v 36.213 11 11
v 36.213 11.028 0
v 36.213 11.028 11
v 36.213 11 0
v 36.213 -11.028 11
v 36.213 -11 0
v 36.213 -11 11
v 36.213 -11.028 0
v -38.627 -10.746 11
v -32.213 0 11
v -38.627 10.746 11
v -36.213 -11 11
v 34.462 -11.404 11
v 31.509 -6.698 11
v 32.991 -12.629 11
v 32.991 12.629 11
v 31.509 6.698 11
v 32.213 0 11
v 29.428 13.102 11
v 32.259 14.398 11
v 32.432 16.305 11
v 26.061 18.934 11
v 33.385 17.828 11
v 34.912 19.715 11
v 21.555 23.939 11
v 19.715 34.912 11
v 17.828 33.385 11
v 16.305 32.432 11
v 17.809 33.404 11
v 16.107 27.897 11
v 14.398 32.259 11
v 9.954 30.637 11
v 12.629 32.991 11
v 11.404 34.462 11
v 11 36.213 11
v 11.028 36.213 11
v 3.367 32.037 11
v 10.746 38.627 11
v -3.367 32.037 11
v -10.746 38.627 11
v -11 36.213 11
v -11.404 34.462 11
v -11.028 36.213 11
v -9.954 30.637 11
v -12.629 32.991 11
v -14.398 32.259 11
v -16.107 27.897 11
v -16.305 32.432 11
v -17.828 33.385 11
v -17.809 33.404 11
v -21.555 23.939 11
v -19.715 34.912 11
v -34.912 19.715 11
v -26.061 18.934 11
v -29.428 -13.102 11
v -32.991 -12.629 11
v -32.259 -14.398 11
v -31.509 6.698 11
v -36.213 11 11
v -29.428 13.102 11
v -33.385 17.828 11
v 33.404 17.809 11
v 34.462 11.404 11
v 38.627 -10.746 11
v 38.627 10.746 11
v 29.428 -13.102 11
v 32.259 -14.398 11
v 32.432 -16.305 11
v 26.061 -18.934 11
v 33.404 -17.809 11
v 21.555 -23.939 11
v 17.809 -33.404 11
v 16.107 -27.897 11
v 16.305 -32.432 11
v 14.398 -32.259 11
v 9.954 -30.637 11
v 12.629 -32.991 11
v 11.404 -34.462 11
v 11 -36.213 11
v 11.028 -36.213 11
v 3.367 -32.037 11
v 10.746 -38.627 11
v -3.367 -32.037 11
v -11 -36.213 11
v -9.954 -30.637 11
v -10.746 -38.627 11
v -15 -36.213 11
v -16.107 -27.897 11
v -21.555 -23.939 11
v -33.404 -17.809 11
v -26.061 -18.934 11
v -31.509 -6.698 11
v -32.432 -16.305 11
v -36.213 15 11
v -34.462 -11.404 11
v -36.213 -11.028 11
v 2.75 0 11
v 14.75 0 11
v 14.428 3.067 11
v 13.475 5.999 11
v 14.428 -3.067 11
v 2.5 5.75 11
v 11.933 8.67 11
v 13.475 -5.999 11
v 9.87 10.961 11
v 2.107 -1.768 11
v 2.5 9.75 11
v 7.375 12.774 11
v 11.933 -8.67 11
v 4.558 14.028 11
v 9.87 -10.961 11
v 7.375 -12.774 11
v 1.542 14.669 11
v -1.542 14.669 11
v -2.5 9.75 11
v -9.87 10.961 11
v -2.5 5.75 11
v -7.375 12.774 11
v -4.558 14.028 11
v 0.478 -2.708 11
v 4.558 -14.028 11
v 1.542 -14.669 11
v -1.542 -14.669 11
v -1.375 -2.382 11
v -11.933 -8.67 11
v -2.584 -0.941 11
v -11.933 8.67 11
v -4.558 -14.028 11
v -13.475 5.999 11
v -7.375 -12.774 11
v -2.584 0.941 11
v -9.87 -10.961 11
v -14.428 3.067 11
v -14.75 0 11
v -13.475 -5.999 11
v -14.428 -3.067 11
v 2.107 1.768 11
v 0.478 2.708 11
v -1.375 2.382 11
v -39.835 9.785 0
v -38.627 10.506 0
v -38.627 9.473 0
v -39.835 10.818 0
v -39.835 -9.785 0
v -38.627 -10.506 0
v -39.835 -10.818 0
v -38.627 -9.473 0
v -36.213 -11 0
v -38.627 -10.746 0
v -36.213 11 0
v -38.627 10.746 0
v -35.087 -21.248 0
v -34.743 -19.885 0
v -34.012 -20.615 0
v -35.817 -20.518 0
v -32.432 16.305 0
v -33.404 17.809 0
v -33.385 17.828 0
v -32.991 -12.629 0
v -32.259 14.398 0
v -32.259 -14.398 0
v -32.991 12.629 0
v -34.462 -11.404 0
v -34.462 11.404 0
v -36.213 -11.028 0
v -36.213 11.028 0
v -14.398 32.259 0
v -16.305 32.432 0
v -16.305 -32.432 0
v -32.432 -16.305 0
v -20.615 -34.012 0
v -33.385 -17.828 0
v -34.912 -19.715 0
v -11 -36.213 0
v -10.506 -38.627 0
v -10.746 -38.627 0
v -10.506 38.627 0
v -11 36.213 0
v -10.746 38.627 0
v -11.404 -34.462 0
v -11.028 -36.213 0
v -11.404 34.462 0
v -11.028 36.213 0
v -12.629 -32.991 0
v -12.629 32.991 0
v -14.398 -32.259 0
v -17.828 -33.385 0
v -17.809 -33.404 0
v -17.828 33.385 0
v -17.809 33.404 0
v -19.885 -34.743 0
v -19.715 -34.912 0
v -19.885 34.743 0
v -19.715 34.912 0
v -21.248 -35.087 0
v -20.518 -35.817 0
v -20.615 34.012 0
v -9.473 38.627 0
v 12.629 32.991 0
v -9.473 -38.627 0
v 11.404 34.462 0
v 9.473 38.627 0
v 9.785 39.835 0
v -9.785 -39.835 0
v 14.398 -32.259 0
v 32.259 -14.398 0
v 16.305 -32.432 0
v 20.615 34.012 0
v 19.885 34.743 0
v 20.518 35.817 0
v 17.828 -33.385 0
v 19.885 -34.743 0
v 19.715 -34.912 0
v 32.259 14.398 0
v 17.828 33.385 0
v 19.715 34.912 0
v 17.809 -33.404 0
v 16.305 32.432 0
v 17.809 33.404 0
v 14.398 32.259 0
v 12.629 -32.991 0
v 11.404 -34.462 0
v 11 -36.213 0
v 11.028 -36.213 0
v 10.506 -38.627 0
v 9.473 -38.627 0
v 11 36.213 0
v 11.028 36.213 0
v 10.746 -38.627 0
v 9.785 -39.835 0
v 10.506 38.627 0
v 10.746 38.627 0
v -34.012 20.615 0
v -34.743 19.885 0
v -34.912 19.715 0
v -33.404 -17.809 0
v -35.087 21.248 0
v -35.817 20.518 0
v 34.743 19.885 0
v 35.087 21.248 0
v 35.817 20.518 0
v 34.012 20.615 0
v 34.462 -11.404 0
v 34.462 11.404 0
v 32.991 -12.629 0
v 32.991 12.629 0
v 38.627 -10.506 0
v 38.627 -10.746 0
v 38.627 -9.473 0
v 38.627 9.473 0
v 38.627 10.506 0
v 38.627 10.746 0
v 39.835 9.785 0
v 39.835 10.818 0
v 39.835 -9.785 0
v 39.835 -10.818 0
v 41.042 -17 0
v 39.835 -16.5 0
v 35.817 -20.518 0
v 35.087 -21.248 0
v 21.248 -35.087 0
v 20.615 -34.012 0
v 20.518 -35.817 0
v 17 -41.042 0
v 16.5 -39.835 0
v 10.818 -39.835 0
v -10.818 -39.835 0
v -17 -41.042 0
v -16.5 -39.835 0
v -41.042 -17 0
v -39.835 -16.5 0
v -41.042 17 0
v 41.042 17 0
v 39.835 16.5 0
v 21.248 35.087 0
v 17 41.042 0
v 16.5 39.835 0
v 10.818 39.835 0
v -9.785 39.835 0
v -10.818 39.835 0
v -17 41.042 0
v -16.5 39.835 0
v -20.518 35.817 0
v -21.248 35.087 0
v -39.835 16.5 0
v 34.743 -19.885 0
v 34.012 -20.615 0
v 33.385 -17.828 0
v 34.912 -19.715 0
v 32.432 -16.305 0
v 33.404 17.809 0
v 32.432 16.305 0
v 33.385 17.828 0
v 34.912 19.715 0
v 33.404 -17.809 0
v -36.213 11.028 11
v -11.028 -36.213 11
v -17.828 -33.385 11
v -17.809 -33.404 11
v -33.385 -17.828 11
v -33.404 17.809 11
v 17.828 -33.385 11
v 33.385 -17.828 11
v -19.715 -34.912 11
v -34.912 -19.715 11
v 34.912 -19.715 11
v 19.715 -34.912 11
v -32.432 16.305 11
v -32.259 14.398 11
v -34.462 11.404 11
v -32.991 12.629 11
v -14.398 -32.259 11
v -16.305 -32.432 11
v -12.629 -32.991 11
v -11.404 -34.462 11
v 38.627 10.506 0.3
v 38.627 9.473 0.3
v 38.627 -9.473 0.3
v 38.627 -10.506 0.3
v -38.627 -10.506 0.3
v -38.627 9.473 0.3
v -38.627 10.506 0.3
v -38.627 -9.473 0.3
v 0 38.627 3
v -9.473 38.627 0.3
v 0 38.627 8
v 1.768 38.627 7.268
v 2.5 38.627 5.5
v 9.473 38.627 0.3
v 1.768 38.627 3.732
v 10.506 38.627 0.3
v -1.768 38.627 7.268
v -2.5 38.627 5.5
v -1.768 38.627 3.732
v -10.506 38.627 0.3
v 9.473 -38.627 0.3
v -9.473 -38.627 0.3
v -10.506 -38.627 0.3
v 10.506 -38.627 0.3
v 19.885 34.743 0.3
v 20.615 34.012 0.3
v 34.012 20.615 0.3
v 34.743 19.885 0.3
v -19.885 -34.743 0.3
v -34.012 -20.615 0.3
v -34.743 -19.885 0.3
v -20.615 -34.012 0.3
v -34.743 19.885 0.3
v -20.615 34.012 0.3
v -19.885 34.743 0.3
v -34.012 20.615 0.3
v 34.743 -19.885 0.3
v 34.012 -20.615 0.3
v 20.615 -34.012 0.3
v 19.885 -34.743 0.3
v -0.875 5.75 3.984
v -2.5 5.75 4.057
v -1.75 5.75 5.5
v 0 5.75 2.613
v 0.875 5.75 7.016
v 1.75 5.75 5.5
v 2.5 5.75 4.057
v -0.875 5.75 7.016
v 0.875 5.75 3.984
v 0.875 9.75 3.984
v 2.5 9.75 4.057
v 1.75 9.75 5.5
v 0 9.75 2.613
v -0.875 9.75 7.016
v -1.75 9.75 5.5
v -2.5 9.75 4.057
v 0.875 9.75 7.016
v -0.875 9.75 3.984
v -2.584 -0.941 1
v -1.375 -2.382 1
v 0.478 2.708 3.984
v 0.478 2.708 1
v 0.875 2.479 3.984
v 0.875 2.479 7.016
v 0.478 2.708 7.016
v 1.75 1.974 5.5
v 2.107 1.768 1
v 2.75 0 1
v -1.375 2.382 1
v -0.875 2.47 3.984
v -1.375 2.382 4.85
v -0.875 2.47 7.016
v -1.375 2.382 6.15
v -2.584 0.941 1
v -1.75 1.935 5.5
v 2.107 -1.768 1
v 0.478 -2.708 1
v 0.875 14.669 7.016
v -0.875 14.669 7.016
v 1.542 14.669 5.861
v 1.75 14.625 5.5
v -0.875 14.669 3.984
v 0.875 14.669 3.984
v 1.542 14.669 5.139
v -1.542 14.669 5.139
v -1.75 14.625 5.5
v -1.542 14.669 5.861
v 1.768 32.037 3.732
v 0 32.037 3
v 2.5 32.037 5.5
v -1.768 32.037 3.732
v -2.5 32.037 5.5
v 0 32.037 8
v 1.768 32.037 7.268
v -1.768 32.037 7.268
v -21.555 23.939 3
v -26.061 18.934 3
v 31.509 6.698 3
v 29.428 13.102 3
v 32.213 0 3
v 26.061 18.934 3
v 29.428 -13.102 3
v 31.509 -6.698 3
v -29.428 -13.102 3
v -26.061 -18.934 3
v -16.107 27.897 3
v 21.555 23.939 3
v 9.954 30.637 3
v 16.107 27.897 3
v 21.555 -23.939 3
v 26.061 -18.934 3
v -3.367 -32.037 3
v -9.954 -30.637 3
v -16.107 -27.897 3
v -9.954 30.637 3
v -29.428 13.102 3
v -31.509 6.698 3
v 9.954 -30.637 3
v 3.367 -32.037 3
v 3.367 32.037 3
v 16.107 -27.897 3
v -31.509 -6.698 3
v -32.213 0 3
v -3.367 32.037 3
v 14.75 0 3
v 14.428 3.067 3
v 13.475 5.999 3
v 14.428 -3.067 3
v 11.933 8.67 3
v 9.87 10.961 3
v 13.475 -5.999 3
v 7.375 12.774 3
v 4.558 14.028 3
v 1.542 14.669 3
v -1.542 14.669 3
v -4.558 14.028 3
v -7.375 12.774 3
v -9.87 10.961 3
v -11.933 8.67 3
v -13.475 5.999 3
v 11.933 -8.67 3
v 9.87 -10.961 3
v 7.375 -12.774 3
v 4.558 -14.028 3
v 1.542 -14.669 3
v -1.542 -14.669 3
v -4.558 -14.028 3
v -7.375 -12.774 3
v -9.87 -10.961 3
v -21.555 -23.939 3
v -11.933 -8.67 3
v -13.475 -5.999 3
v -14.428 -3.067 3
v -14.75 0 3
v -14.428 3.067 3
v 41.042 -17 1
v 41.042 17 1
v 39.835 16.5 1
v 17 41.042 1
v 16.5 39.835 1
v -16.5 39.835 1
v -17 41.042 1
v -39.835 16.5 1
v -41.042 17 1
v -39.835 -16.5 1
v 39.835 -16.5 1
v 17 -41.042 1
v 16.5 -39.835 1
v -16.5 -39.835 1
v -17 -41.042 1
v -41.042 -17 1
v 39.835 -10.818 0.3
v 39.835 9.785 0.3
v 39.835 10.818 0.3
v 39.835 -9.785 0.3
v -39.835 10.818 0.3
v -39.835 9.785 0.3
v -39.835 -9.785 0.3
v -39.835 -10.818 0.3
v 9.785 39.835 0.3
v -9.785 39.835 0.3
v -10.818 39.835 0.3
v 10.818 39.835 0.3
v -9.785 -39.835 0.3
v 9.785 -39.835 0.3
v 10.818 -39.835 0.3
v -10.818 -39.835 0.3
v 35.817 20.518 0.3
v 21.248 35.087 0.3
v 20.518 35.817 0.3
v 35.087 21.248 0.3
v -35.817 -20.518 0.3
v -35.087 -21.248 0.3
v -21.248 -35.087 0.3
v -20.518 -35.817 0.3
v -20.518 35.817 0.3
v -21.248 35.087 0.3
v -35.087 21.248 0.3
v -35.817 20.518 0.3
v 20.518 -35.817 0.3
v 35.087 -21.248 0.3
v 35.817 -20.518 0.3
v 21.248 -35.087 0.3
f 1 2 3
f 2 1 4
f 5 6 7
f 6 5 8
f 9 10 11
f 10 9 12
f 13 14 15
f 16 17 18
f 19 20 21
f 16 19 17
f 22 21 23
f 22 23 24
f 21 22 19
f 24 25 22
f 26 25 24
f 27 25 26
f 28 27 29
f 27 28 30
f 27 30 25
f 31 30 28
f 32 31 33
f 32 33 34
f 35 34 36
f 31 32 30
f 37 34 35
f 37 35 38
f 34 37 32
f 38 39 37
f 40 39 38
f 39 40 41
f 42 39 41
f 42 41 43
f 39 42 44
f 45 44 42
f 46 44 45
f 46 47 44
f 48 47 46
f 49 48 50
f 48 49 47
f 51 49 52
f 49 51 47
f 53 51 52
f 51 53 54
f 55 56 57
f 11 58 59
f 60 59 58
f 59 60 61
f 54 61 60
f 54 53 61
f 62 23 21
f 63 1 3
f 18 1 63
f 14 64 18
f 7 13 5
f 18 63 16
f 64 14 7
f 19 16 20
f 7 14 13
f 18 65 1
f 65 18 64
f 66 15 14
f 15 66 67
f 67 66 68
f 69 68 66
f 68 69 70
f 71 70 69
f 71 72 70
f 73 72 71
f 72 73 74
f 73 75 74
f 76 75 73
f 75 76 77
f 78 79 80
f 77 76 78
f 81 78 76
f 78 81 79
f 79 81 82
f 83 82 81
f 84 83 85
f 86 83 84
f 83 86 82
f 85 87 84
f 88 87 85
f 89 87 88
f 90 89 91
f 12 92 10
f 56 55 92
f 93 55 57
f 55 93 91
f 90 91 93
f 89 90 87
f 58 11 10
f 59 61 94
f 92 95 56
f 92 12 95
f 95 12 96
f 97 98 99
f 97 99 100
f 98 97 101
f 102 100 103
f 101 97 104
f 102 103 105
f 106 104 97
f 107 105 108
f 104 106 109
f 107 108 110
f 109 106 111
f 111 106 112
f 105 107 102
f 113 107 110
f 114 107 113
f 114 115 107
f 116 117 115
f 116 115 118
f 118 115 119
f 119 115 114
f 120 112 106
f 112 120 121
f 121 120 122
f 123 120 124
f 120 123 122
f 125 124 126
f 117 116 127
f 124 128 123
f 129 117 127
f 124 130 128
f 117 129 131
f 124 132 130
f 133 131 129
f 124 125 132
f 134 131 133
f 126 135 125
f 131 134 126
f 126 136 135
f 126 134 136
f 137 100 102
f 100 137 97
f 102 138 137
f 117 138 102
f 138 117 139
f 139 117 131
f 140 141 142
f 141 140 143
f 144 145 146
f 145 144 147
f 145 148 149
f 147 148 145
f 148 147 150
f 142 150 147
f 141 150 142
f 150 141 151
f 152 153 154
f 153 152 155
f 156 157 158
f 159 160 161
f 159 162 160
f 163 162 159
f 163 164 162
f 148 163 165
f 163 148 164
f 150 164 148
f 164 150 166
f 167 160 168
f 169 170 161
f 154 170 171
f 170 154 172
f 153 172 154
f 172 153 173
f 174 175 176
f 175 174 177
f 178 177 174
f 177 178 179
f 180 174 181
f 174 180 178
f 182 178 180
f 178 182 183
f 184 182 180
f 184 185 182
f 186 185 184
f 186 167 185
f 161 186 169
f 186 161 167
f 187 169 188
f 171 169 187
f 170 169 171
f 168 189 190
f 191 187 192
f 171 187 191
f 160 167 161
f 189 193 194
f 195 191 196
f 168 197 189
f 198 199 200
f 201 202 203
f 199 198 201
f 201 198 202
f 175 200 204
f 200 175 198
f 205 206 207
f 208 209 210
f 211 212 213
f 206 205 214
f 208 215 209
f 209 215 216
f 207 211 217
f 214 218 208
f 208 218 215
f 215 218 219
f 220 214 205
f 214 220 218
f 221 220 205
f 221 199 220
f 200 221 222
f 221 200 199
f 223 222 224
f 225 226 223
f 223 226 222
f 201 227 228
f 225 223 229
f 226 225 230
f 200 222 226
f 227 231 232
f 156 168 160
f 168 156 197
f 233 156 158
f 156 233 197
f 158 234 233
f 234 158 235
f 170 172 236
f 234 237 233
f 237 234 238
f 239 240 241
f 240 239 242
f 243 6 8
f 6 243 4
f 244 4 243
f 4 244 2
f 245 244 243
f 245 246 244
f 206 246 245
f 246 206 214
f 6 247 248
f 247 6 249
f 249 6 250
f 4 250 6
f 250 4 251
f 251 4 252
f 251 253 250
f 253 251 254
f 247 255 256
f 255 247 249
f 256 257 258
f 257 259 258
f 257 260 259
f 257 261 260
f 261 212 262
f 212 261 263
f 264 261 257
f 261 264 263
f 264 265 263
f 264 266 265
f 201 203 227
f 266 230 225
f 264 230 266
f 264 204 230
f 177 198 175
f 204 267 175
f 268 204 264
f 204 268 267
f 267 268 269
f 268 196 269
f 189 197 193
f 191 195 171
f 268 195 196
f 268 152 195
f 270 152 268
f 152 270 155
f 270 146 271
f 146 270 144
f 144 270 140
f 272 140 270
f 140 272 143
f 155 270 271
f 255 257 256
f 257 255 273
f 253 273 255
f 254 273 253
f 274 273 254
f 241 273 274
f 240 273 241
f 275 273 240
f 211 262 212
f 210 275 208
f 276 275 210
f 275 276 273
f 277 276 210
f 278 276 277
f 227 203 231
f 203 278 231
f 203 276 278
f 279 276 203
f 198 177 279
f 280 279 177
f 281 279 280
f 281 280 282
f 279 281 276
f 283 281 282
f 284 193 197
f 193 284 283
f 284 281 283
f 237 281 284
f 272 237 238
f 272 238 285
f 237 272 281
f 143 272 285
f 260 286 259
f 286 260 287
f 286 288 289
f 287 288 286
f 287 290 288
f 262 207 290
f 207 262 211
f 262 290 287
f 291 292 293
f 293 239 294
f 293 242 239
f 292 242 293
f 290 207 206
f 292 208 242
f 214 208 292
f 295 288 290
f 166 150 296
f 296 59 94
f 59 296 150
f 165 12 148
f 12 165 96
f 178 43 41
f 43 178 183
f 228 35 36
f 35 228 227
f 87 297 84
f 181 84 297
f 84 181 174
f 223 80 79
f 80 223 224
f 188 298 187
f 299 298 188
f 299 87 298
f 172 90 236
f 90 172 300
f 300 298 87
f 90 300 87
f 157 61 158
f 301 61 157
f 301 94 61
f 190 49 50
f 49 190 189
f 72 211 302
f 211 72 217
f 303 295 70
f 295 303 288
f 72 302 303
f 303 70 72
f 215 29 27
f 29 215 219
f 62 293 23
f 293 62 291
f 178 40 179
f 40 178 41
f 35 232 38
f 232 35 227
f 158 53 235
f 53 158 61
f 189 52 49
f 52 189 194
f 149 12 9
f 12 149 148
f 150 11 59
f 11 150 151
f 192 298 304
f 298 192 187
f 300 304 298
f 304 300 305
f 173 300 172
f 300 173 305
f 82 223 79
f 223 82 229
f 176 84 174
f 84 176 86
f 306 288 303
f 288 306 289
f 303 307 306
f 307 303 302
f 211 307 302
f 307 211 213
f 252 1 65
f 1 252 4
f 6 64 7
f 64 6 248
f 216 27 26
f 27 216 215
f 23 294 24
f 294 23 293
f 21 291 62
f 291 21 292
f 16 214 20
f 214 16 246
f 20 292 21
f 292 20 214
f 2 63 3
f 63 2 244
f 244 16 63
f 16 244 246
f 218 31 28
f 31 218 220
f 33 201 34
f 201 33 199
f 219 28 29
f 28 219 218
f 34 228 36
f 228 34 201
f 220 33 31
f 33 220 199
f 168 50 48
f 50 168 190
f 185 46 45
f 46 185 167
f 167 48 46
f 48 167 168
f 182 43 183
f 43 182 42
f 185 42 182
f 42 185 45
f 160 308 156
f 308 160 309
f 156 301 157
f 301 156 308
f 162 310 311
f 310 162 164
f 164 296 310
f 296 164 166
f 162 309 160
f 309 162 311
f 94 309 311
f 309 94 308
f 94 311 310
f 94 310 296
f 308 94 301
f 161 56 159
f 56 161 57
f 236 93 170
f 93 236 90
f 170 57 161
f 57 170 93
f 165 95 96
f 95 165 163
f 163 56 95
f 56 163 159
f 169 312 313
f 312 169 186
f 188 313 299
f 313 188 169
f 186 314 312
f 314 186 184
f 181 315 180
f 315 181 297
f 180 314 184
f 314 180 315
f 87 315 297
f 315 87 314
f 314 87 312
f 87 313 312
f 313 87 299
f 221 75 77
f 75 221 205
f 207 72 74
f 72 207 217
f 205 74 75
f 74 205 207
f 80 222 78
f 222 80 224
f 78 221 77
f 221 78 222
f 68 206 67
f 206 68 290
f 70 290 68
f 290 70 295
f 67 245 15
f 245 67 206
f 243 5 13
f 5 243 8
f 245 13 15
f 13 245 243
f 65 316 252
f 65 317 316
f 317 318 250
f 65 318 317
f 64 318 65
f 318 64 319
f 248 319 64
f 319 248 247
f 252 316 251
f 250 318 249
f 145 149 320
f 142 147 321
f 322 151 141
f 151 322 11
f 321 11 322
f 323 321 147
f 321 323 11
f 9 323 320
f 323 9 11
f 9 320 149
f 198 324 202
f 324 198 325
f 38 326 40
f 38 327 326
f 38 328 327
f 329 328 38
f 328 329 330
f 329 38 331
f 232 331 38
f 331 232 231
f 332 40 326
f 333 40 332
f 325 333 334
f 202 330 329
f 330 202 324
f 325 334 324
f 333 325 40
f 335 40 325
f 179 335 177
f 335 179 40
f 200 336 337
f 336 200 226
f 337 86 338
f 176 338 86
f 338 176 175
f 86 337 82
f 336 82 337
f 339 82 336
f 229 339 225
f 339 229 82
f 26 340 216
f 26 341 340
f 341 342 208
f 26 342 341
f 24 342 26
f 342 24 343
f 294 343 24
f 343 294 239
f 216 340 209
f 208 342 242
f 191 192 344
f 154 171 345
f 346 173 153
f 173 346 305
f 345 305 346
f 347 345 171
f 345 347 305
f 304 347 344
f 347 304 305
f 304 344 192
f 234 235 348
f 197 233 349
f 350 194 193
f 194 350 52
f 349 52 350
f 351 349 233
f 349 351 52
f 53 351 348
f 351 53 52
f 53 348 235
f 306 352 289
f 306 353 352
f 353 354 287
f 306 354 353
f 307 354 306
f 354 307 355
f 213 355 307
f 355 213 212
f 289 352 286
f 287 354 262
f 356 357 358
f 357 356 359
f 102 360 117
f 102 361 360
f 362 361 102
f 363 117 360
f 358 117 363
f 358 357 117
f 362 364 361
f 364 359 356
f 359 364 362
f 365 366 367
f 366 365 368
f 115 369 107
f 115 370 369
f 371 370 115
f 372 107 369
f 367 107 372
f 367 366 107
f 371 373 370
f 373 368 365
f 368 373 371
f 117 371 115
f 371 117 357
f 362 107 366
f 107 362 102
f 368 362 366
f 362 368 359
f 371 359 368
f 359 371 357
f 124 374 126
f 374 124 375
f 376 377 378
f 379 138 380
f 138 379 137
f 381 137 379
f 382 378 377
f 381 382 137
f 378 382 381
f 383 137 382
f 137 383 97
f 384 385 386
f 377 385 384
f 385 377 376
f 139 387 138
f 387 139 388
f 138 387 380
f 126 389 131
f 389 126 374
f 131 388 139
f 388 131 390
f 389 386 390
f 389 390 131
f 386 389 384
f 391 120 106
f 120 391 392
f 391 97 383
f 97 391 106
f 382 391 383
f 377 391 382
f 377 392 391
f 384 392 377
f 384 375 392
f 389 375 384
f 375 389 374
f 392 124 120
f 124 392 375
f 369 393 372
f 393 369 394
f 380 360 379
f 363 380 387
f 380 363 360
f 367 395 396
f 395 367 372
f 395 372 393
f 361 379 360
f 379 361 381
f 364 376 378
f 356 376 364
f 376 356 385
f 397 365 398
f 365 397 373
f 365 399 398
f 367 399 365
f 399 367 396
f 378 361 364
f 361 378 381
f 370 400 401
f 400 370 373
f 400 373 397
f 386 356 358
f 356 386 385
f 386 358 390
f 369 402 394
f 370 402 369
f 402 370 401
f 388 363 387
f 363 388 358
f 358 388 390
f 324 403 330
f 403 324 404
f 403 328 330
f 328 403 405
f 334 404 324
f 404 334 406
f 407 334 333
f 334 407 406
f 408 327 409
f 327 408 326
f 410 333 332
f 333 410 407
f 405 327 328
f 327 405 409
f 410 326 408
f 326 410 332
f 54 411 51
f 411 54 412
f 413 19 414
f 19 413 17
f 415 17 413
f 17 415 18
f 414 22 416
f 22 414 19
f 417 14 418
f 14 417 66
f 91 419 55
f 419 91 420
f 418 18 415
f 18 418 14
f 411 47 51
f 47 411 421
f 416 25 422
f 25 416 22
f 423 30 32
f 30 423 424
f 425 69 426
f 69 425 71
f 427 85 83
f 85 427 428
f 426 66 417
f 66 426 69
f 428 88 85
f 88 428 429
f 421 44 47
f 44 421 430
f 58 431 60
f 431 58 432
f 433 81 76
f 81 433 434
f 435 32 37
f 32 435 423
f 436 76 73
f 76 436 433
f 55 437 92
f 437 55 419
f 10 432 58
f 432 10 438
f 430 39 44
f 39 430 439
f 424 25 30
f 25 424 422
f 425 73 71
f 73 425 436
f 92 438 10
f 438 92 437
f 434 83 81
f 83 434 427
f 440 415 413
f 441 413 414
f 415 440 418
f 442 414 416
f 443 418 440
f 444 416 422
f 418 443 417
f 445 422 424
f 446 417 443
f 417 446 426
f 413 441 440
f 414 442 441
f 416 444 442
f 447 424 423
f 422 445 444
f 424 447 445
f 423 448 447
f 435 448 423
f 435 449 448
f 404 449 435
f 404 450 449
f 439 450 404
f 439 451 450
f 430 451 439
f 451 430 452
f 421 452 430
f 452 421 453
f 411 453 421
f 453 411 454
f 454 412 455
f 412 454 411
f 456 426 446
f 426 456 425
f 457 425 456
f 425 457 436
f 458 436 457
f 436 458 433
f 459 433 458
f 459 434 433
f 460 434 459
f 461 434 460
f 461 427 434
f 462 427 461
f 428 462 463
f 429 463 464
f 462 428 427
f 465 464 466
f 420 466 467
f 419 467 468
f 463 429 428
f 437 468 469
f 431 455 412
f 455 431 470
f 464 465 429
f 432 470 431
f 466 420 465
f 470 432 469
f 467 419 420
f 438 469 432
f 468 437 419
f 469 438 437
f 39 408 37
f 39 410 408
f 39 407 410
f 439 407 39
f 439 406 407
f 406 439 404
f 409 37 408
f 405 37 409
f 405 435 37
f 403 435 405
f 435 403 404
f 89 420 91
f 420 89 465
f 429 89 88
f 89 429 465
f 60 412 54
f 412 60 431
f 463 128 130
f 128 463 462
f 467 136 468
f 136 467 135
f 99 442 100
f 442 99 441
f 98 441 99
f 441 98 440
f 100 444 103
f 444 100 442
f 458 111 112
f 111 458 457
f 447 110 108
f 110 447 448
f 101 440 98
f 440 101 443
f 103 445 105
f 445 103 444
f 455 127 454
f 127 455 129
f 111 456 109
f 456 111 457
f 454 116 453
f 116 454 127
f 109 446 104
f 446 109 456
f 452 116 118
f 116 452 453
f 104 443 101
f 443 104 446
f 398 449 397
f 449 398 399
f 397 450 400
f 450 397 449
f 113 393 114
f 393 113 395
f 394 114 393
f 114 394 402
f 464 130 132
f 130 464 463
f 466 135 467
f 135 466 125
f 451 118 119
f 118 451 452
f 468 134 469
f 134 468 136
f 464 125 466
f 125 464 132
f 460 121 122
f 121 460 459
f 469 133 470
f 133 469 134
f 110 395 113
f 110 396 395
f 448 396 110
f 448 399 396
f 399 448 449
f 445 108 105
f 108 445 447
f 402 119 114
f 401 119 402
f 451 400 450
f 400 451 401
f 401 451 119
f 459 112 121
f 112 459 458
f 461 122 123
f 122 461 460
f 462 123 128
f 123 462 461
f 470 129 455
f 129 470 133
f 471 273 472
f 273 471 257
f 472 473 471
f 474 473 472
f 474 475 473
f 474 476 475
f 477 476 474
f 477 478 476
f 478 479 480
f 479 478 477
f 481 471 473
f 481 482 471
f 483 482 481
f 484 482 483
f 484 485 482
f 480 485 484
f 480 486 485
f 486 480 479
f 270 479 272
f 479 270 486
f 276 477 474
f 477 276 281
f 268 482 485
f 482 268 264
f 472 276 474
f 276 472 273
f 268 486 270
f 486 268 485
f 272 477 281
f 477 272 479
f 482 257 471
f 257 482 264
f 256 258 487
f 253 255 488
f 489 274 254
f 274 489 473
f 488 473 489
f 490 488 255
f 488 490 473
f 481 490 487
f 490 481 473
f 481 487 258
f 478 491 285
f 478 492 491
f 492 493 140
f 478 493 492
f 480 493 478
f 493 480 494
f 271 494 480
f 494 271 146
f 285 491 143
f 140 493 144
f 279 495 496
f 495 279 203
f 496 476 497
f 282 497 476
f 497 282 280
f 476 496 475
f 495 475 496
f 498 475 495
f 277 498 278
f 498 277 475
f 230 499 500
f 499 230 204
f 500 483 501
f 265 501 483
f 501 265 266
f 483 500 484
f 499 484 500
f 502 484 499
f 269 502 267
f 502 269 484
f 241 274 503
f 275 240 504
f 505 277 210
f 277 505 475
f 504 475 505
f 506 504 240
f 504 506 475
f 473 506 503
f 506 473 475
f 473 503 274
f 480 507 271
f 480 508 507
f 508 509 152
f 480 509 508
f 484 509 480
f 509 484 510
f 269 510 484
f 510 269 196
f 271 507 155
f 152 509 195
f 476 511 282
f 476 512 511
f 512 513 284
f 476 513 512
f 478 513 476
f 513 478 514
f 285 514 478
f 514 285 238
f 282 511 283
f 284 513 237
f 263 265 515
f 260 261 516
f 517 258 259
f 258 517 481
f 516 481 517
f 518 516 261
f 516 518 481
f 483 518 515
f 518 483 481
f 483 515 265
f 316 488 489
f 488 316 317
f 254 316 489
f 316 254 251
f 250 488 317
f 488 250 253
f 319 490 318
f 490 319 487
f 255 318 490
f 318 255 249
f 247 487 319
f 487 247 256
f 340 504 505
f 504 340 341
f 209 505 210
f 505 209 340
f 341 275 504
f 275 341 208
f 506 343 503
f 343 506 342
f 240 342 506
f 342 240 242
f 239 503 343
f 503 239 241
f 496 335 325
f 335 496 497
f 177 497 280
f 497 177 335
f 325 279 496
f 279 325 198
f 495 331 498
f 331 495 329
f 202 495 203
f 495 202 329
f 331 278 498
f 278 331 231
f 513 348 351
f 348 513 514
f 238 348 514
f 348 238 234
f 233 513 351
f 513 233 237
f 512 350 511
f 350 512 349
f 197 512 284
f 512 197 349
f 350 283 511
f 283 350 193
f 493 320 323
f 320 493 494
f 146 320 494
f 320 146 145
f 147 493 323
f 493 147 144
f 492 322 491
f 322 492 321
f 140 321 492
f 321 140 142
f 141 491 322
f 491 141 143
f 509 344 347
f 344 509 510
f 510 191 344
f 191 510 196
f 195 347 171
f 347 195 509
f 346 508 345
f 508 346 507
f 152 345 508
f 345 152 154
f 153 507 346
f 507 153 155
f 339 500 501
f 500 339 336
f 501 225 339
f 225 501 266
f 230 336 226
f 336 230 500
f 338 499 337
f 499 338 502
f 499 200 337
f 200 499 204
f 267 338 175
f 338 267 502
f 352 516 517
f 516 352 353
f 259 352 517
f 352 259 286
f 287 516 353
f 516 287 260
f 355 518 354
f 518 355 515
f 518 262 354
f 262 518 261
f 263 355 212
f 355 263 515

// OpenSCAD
module hexnut(flats=10, depth=5){
	sliceangle = 360 / 6;
	pointradius = flats / (2 * cos(sliceangle/2));
	flatoffset = flats * tan(sliceangle/2) / 2;
	union(){
		for(angle=[0:sliceangle:360]) {
			rotate(angle,[0,0,1]) linear_extrude(height=depth) polygon(points=[[0,-1],[flatoffset,flats/2],[-flatoffset,flats/2]],paths=[[0,1,2]]);
		}
	}
}


module octagon(side=30, height=12){
 	width = side+(2*sqrt((side*side)/2));
	translate([0,0,height/2]) intersection(){
		cube([width, width, height],center=true);
		rotate(45,[0,0,1])cube([width, width, height],center=true);
	}
}

module gear(face=30, cutout=8, height=11) {
	width = face+(2*sqrt((face*face)/2));
	nutflats = 5;// nut, flat to flat
	nutheight = 4; // nut, base to top
	screwshaft =  3.5; // screw shaft diameter
	screwhead = 5; // screw head diameter
	screwlength = 30; // screw length
	motorshaft = 5.5;
	motorshaftlength = 10;
	motorflatdepth=1;
	cutout_r = cutout/2;
	vertex_r = sqrt(((face/2)*(face/2))+((width/2)*(width/2)));
	difference() {
		union() {
			difference(){
				union() {
					octagon(face,height);
					for(angle=[0:45:315]){
						rotate(angle,[0,0,1]) translate([0,width/2,0])toothcurve(edge=face, height=height, cutout=cutout);
					}
				}
				union() {
					for(angle=[0:45:315]) {
						rotate(angle,[0,0,1]) rotate(22.5,[0,0,1]) translate([vertex_r,0,0])cylinder(r=cutout_r,h=height);
					}
					difference(){
						octagon(face+25,height);
						octagon(face+2,height);
					}
				}
				union() {
					translate([0,0,1]) cylinder(r=motorshaft/2,h=motorshaftlength);
					translate([-nutflats/2,((motorshaft/2)+3),height/2]) cube([nutflats,nutheight,height/2]);
					translate([0,0,height/2]) rotate(270,[1,0,0]) cylinder(r=screwshaft/2,h=width);
					translate([0,screwlength,height/2]) rotate(270,[1,0,0]) cylinder(r=screwhead/2,h=width);
					translate([0,((motorshaft/2)+3),height/2]) rotate(270,[10,0,0]) rotate(90,[0,0,1]) hexnut(flats=nutflats,depth=nutheight);
				}
				difference() {
					translate([0,0,3])cylinder(r=(width/2)-((cutout/2)),h=height);
					translate([0,0,3])cylinder(r=(motorshaft/2)+3+nutheight+5,h=height);
				}
			}
		}	
	}
}

module surround(inner=30) {
	difference(){
		octagon(inner+4,1);
		octagon(inner+3,1);
	}
	for(rotation=[0:45:360]){
		rotate(rotation+14.5,[0,0,1]) translate([(inner/2)+(inner*0.4),-0.5,0]) cube([inner/2,1,0.3]);
		rotate(rotation-14.5,[0,0,1]) translate([(inner/2)+(inner*0.4),-0.5,0]) cube([inner/2,1,0.3]);
	}
}

gear();
surround();

module toothcurve(edge=30,height=5,cutout=8,wiggle=1) {
	intersection() {
		translate([edge/2,0,0])cylinder(r=edge-(cutout/2),h=height);
		translate([-edge/2,0,0])cylinder(r=edge-(cutout/2),h=height);
	}
}

//translate([5,0,0]) cube([34,1,4]);
